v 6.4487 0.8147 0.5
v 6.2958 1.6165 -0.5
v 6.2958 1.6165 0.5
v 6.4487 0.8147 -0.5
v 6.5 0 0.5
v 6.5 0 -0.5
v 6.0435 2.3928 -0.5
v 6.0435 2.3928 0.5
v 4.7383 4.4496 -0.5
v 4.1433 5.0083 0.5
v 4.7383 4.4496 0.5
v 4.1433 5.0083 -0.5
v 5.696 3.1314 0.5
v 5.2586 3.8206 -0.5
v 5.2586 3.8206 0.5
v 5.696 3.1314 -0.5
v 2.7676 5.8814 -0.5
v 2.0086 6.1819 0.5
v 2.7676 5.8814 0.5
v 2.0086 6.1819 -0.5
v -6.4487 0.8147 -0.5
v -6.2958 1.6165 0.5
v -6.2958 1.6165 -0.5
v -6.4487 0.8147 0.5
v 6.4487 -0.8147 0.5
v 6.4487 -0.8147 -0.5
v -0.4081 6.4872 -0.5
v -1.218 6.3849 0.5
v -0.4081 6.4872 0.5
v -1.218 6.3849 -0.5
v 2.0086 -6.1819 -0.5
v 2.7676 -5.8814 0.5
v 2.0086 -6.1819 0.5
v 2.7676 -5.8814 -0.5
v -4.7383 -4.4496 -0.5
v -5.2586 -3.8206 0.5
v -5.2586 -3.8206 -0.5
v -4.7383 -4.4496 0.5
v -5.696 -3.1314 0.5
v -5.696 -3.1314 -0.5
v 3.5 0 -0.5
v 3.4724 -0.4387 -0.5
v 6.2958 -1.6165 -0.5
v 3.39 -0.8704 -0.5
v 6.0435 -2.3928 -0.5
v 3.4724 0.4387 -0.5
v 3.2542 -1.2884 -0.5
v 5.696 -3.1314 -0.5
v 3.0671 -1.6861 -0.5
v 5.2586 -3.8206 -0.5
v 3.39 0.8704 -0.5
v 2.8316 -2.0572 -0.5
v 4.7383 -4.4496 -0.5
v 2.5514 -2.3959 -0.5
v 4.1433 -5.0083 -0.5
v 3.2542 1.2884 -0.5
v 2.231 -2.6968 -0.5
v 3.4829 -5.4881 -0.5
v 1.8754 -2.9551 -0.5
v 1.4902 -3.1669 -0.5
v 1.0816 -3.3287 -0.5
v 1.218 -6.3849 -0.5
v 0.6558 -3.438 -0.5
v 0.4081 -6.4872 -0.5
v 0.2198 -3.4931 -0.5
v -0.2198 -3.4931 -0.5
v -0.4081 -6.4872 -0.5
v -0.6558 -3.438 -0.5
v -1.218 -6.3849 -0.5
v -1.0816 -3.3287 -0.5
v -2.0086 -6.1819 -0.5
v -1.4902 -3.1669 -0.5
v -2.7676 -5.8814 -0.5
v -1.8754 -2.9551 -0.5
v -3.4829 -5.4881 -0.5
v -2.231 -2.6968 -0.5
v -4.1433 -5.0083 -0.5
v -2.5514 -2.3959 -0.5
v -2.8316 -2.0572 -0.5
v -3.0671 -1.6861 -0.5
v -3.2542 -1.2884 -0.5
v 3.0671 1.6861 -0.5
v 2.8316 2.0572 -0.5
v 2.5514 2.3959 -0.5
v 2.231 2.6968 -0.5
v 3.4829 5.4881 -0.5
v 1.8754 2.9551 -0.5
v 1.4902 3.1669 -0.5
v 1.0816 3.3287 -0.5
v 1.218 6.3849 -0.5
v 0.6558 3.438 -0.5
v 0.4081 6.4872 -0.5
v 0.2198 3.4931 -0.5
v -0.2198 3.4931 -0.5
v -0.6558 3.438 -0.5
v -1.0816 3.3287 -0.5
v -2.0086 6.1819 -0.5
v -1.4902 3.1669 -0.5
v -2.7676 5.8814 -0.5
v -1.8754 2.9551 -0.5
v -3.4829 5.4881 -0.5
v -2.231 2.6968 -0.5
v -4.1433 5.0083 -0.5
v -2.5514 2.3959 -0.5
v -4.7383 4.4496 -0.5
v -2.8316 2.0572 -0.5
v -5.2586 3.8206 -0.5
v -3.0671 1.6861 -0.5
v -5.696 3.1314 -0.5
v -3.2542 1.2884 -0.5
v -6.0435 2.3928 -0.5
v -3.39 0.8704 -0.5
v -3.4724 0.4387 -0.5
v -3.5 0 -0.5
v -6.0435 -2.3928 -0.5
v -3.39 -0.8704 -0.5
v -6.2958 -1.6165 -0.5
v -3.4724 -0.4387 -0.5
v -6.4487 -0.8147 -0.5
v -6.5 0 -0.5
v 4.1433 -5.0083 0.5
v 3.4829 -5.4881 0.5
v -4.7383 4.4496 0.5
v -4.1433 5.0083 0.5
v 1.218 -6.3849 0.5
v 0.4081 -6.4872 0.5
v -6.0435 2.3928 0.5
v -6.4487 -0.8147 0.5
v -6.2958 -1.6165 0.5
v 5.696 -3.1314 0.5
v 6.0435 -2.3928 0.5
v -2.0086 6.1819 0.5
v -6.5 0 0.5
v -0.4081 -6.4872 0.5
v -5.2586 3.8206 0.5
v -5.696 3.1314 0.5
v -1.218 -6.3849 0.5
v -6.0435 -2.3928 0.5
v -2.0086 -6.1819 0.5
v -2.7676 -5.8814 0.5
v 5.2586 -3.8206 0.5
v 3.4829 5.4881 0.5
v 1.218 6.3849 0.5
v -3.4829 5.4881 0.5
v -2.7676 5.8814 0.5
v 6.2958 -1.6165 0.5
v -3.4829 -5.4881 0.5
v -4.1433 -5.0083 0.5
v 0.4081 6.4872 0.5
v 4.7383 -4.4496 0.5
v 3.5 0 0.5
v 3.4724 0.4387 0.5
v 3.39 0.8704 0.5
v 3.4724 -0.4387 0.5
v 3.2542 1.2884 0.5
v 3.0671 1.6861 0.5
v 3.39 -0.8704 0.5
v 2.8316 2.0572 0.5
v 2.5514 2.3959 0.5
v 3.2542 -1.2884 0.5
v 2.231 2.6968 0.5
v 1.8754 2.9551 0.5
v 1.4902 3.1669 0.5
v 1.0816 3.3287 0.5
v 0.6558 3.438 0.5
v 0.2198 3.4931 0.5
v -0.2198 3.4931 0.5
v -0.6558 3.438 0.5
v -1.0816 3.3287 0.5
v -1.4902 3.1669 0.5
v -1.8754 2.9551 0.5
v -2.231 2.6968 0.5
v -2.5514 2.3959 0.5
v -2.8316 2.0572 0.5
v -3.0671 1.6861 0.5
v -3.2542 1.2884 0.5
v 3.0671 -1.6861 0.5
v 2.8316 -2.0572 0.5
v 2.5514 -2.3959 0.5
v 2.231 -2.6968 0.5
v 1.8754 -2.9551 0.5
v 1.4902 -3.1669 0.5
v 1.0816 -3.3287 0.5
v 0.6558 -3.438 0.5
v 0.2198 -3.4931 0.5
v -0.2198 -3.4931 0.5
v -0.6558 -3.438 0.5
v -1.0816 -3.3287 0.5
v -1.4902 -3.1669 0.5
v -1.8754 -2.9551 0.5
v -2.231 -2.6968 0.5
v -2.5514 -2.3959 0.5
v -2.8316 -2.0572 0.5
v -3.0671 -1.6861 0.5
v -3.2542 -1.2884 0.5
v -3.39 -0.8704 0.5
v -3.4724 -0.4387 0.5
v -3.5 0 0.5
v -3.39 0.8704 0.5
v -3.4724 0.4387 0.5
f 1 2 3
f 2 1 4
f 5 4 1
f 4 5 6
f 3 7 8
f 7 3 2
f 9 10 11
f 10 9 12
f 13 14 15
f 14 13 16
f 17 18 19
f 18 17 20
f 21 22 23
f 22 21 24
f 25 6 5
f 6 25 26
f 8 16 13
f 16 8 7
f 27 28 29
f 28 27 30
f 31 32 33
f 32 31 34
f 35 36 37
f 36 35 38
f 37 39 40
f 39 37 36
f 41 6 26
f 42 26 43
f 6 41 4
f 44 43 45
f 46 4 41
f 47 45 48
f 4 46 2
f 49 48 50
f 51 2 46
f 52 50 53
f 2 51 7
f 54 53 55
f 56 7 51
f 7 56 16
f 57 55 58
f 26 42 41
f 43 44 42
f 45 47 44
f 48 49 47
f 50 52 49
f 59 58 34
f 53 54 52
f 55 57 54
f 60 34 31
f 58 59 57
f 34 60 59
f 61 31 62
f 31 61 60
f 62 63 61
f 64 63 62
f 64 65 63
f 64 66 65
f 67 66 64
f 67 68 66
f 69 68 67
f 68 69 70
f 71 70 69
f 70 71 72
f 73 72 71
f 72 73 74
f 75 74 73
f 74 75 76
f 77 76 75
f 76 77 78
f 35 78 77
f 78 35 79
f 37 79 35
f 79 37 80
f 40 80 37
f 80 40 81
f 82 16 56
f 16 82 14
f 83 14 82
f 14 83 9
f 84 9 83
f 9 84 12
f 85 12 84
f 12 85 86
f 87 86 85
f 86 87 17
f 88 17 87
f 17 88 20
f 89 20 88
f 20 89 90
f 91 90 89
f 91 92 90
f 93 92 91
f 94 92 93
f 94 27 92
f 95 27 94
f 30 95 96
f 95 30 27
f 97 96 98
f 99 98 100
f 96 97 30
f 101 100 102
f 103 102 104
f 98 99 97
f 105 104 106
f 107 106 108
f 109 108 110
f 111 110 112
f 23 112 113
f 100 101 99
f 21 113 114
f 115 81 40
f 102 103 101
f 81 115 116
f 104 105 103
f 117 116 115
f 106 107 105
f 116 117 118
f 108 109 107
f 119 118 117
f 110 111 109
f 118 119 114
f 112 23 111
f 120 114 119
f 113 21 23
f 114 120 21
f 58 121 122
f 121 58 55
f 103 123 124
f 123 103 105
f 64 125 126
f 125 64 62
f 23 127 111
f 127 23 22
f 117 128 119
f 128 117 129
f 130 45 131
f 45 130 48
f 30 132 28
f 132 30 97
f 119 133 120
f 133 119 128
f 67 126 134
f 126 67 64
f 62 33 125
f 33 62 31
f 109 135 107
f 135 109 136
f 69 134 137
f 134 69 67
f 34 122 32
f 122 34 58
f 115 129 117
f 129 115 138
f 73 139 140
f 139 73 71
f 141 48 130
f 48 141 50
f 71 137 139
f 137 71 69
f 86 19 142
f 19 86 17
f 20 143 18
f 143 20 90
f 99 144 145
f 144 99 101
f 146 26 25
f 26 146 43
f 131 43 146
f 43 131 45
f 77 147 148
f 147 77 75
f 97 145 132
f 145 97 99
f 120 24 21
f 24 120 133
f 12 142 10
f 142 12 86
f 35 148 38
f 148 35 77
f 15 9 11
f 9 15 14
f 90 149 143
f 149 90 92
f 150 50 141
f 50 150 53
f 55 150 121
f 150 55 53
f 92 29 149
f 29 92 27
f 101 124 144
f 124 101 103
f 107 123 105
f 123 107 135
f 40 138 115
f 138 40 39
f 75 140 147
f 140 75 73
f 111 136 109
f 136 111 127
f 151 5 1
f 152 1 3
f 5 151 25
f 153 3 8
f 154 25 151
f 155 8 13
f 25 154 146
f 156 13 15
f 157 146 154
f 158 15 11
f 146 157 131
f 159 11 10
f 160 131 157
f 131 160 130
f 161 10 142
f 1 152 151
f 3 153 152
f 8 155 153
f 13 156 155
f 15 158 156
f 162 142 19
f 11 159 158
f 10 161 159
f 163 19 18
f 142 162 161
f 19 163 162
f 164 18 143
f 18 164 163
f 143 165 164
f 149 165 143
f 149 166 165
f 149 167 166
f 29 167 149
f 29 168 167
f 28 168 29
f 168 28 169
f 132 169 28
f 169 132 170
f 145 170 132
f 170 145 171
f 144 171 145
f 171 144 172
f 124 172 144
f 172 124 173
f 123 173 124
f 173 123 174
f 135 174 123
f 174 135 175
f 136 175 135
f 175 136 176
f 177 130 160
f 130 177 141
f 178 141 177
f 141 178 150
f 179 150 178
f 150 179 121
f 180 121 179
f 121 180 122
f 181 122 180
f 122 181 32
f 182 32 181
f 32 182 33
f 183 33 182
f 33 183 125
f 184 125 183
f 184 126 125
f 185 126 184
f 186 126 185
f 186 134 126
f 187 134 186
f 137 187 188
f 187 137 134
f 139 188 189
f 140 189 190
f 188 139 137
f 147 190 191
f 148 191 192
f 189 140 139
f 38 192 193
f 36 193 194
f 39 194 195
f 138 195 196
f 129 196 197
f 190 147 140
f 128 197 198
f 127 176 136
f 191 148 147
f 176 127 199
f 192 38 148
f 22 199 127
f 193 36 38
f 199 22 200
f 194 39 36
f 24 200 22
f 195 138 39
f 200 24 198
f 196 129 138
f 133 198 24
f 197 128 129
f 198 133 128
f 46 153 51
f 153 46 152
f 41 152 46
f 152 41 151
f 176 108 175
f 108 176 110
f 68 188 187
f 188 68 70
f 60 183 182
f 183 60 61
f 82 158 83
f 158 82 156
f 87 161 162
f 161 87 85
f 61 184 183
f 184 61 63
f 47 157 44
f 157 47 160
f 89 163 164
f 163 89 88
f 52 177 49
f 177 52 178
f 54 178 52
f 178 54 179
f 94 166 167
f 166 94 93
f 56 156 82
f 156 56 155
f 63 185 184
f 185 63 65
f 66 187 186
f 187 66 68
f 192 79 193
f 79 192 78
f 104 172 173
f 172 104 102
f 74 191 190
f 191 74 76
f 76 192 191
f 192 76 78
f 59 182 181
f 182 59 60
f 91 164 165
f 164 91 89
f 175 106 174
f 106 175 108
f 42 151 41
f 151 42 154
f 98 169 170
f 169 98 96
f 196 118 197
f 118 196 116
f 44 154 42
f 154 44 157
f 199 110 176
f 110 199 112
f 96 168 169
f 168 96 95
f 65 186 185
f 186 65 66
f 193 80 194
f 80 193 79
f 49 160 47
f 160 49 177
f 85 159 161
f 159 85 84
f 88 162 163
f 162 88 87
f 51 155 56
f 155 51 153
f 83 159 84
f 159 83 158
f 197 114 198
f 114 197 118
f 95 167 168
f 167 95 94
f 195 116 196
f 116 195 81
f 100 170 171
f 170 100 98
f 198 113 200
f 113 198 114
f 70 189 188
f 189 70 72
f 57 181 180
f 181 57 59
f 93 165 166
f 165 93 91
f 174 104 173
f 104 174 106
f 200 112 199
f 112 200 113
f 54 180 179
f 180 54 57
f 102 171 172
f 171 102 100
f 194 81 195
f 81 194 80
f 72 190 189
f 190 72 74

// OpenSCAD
$fn = 50;


difference() {
	union() {
		translate(v = [0, 0, -0.5000000000]) {
			cylinder(h = 1, r = 6.5000000000);
		}
	}
	union() {
		translate(v = [0, 0, -100.0000000000]) {
			cylinder(h = 200, r = 3.5000000000);
		}
	}
}
